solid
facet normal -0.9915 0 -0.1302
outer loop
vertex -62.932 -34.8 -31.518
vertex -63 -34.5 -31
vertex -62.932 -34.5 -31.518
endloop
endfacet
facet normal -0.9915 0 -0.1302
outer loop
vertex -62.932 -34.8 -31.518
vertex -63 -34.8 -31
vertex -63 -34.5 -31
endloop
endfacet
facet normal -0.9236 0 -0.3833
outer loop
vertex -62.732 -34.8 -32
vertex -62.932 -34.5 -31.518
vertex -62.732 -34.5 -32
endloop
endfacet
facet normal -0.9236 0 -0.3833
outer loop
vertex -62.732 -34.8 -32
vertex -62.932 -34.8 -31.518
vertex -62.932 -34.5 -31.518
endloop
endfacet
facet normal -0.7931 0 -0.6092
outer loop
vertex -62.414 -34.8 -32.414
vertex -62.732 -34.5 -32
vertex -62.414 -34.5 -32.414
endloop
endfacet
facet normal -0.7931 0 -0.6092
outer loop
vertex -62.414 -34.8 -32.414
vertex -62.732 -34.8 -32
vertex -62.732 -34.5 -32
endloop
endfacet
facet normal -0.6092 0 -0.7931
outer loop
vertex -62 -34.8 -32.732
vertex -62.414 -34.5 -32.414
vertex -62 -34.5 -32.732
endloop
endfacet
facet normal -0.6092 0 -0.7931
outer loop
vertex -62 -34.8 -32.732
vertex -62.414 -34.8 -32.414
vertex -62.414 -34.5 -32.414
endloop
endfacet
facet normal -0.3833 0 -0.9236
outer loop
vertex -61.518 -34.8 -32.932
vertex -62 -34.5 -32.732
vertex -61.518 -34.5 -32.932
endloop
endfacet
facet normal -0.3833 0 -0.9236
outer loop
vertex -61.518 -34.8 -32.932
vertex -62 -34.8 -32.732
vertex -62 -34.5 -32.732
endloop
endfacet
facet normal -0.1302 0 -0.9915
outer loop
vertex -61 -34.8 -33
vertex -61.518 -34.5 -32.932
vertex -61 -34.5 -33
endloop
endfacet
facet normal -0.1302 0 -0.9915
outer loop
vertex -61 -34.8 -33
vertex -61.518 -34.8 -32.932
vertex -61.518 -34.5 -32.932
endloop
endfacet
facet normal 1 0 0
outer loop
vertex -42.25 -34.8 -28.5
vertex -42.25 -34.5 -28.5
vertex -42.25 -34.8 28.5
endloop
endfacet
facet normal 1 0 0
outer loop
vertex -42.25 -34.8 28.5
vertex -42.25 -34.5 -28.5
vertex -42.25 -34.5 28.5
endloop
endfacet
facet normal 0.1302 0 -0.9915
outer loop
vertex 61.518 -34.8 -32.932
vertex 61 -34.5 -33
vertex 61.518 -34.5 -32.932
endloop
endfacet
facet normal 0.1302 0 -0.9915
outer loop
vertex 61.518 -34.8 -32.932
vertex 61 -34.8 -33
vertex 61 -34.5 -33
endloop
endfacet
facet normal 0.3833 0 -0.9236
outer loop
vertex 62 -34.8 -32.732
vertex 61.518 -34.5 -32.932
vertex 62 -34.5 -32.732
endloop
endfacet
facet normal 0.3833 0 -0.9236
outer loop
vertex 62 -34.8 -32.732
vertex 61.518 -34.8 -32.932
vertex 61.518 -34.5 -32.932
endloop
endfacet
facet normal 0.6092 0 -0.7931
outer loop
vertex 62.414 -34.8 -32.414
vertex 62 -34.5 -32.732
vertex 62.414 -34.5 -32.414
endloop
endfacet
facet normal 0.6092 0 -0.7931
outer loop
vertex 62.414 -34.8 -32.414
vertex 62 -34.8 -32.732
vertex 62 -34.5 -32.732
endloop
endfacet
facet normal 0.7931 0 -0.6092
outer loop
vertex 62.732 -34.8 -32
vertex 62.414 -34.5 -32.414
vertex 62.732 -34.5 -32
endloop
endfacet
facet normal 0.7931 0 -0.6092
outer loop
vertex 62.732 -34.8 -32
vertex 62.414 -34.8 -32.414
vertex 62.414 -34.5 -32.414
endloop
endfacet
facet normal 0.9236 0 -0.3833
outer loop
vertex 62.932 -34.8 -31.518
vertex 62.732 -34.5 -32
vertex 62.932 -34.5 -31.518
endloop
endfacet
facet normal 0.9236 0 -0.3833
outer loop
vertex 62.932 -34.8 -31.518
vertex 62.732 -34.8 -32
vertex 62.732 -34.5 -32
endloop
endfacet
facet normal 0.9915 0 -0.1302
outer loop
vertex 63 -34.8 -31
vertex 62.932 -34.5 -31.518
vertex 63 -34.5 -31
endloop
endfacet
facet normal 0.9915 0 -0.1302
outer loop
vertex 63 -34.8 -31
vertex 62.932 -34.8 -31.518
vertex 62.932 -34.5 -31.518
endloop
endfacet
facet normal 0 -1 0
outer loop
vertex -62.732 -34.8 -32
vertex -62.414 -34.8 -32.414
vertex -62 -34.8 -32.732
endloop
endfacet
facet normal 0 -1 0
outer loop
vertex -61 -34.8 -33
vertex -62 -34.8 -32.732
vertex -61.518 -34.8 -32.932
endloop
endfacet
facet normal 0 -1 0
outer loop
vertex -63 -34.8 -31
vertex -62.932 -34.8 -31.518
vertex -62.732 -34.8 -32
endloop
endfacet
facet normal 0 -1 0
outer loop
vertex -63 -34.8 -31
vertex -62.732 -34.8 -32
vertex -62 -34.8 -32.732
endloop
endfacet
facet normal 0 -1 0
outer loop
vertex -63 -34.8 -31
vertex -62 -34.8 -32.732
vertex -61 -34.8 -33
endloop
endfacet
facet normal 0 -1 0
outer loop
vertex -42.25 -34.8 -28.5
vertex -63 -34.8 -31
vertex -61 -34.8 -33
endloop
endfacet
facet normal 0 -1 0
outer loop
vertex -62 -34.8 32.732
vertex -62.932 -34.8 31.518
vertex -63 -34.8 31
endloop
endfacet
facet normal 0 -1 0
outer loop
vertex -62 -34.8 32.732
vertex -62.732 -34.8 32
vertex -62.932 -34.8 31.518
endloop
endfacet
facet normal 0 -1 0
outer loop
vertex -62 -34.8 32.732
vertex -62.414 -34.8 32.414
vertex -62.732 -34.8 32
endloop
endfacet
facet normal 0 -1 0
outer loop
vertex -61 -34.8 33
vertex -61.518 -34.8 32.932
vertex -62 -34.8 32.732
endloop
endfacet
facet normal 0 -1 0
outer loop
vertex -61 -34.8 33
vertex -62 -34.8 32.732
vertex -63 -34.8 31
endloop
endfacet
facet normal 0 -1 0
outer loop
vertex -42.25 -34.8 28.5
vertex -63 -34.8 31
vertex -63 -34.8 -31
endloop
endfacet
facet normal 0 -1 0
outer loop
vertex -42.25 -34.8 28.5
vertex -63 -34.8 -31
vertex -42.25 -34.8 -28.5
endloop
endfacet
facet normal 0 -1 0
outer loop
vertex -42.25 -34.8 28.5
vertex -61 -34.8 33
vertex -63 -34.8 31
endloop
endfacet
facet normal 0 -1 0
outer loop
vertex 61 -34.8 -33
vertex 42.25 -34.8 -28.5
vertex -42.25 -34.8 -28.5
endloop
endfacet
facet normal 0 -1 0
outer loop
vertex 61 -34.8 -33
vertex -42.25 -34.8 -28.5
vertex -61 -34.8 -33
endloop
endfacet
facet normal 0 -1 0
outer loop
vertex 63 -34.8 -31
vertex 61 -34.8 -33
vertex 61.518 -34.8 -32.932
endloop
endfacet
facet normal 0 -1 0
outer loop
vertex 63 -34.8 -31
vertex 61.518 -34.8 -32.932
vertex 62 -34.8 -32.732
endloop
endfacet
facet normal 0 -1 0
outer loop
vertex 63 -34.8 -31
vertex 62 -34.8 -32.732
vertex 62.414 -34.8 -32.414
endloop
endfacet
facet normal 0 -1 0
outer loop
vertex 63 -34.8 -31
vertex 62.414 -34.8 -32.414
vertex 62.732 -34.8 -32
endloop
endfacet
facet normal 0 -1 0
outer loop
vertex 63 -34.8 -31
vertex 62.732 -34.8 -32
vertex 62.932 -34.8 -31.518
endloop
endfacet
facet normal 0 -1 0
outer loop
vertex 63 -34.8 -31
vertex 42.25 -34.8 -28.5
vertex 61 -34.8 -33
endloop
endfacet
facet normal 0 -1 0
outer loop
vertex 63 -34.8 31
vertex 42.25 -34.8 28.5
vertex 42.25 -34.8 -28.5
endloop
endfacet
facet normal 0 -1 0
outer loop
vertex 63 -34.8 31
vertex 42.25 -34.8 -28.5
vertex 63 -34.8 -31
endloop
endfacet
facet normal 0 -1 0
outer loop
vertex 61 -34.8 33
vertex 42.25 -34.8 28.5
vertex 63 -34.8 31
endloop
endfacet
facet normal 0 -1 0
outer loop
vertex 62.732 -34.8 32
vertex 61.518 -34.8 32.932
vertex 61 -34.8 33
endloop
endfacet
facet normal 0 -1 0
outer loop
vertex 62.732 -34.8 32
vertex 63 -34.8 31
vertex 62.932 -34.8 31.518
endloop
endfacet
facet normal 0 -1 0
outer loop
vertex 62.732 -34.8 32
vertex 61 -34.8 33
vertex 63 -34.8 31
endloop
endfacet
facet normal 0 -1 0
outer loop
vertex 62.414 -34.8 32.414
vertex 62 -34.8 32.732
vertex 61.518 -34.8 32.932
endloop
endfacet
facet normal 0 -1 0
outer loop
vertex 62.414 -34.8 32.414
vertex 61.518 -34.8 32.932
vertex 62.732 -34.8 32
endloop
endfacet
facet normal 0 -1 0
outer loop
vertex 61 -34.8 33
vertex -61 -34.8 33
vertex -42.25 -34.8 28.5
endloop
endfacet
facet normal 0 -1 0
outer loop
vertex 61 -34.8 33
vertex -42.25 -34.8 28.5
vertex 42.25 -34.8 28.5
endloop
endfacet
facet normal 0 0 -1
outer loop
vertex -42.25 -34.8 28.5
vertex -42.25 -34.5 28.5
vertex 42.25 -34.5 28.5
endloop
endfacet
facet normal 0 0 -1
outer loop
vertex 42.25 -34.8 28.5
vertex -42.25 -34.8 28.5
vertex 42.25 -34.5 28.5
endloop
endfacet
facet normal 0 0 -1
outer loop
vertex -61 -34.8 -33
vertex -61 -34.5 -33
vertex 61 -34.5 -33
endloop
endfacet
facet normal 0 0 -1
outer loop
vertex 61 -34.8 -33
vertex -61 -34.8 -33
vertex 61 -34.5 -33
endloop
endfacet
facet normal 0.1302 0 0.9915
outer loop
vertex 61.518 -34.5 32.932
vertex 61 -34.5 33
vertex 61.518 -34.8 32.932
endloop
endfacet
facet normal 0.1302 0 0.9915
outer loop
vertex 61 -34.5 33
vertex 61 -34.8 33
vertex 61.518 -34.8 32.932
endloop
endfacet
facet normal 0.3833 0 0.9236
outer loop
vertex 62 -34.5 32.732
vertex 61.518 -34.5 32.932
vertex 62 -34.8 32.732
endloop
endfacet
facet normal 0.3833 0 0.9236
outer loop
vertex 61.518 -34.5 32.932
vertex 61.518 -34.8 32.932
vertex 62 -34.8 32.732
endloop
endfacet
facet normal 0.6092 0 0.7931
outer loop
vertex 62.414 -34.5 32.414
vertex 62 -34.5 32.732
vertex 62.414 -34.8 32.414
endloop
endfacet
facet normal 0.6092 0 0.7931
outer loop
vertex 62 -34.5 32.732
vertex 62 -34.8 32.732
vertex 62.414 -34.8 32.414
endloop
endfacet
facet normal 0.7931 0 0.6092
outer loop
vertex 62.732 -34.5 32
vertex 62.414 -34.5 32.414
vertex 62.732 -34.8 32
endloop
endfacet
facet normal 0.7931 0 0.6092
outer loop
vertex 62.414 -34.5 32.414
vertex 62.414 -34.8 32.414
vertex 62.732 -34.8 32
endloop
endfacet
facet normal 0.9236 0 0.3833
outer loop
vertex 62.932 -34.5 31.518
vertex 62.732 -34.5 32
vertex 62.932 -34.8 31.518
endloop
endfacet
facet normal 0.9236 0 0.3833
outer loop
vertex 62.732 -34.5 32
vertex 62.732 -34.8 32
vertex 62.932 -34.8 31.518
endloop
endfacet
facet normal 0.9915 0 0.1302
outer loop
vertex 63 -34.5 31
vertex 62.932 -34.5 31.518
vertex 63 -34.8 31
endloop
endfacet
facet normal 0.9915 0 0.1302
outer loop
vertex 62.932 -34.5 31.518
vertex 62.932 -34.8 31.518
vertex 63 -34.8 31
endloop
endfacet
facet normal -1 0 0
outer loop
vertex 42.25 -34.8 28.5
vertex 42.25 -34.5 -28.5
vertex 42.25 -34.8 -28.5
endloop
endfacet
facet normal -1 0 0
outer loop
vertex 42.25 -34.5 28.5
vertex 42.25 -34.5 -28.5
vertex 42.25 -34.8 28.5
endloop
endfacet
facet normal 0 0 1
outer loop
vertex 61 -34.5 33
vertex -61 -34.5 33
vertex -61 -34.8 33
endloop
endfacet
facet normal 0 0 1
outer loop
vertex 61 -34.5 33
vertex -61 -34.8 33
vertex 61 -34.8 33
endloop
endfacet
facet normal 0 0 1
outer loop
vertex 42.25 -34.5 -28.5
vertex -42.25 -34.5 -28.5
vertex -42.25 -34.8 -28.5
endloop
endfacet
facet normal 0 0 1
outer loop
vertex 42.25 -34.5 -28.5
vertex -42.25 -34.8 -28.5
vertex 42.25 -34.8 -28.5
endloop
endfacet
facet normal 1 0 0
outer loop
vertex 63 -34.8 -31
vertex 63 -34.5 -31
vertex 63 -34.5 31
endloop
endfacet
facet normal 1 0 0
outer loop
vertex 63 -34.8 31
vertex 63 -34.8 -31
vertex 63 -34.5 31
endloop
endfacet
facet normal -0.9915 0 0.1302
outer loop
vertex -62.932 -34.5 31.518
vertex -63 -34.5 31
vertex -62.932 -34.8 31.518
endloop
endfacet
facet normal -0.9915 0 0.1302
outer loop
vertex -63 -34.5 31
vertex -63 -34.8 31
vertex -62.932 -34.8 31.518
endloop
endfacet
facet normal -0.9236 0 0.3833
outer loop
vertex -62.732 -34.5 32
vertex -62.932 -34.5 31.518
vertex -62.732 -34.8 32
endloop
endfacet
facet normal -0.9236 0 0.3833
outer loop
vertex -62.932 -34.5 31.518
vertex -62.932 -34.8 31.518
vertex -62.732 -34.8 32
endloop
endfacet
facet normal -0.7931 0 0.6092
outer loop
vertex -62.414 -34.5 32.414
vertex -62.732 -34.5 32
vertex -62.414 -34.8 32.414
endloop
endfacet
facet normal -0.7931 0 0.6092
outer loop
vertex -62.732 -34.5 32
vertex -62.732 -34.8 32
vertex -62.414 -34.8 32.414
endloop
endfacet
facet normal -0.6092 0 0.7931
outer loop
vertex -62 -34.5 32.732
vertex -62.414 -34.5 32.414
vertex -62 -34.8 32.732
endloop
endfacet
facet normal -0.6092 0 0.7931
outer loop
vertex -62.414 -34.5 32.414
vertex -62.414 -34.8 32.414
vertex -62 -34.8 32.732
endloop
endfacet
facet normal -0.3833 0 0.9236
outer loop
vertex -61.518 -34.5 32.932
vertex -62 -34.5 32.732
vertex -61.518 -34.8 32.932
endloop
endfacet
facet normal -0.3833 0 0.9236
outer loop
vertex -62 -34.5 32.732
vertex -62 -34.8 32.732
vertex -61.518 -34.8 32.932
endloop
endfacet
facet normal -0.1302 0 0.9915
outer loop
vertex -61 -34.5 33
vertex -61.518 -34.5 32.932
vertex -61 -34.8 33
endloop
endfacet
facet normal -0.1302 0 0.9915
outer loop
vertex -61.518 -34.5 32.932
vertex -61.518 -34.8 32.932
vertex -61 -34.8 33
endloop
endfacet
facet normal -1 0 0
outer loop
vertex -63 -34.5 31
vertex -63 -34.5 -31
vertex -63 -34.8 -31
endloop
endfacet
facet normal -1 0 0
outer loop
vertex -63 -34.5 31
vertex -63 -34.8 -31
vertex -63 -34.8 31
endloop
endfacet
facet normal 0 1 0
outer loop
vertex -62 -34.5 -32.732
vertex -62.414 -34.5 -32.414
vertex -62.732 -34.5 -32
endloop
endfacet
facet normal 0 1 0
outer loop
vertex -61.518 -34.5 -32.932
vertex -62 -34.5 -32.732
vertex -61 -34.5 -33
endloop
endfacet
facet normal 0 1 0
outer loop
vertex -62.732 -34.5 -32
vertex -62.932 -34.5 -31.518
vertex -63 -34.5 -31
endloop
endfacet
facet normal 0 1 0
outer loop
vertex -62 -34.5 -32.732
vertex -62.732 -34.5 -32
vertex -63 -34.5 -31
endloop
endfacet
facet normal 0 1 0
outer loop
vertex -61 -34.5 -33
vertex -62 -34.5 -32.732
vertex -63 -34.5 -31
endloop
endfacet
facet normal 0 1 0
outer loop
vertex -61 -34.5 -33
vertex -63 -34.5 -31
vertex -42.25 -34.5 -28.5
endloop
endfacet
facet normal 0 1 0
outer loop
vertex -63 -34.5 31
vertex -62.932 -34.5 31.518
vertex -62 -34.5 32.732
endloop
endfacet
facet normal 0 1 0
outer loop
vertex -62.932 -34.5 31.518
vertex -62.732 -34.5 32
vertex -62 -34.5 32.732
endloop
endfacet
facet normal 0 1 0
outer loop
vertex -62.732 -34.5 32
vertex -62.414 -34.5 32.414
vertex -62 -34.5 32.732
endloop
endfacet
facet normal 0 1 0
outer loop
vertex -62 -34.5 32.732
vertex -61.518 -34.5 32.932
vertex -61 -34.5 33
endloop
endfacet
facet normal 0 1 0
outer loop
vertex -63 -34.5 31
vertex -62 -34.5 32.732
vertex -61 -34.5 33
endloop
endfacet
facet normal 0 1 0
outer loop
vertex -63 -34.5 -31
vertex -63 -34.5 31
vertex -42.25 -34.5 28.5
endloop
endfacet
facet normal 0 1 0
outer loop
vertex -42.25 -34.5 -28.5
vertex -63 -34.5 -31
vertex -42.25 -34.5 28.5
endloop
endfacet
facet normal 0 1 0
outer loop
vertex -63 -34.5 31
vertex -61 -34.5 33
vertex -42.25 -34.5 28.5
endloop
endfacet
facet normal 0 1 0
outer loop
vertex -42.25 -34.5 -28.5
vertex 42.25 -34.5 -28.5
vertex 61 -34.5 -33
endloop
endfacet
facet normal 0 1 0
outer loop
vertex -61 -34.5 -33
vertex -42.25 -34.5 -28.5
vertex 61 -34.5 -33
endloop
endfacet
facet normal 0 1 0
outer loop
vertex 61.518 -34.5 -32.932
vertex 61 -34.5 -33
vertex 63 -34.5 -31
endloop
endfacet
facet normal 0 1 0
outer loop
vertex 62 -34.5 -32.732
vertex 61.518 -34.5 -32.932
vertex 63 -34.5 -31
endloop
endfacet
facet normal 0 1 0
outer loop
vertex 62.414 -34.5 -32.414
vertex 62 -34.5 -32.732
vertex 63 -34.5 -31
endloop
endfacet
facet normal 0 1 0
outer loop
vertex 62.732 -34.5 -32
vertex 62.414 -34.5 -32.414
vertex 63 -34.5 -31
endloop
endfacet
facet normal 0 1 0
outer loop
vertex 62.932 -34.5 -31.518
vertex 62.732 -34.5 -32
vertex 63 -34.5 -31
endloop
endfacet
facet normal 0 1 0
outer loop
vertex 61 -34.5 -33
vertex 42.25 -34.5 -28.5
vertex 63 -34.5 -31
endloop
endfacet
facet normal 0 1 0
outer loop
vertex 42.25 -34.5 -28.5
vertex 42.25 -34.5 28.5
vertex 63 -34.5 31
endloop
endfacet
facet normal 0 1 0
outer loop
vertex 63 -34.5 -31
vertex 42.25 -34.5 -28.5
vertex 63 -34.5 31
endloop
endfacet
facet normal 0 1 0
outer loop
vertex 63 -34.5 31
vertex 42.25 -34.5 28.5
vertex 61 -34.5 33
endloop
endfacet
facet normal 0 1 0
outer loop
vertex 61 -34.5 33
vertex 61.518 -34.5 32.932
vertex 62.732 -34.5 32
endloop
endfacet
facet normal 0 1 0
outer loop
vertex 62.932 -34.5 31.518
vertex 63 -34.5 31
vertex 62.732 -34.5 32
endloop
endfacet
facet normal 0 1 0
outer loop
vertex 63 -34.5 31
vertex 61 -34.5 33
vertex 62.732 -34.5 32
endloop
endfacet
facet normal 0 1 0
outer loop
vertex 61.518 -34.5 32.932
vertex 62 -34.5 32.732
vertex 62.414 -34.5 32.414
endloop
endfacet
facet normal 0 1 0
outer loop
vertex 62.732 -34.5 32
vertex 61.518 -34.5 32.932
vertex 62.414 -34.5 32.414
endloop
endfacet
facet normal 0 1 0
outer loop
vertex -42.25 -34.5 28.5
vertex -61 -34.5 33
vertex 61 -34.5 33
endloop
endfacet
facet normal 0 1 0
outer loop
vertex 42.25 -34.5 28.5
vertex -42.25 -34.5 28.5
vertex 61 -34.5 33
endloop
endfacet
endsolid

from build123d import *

# Parameters (mm, degrees)
SKETCH1_W           = 126
SKETCH1_H           = 66
SKETCH1_W_2         = 84.5
SKETCH1_H_2         = 57
BOSS_EXTRUDE1_DEPTH = 0.3
FILLET1_R           = 2


with BuildPart() as part:
    # Sketch1 → Boss-Extrude1 (new body)
    with BuildSketch(Plane.XZ.offset(34.5)):
        Rectangle(SKETCH1_W, SKETCH1_H)
        Rectangle(SKETCH1_W_2, SKETCH1_H_2, mode=Mode.SUBTRACT)
    extrude(amount=BOSS_EXTRUDE1_DEPTH)

    # Fillet1
    fillet1_edges = [part.edges().sort_by_distance(p)[0] for p in [
        (63, -34.65, -33),
        (-63, -34.65, -33),
        (-63, -34.65, 33),
        (63, -34.65, 33),
    ]]
    fillet(fillet1_edges, radius=FILLET1_R)


solid = part.part
